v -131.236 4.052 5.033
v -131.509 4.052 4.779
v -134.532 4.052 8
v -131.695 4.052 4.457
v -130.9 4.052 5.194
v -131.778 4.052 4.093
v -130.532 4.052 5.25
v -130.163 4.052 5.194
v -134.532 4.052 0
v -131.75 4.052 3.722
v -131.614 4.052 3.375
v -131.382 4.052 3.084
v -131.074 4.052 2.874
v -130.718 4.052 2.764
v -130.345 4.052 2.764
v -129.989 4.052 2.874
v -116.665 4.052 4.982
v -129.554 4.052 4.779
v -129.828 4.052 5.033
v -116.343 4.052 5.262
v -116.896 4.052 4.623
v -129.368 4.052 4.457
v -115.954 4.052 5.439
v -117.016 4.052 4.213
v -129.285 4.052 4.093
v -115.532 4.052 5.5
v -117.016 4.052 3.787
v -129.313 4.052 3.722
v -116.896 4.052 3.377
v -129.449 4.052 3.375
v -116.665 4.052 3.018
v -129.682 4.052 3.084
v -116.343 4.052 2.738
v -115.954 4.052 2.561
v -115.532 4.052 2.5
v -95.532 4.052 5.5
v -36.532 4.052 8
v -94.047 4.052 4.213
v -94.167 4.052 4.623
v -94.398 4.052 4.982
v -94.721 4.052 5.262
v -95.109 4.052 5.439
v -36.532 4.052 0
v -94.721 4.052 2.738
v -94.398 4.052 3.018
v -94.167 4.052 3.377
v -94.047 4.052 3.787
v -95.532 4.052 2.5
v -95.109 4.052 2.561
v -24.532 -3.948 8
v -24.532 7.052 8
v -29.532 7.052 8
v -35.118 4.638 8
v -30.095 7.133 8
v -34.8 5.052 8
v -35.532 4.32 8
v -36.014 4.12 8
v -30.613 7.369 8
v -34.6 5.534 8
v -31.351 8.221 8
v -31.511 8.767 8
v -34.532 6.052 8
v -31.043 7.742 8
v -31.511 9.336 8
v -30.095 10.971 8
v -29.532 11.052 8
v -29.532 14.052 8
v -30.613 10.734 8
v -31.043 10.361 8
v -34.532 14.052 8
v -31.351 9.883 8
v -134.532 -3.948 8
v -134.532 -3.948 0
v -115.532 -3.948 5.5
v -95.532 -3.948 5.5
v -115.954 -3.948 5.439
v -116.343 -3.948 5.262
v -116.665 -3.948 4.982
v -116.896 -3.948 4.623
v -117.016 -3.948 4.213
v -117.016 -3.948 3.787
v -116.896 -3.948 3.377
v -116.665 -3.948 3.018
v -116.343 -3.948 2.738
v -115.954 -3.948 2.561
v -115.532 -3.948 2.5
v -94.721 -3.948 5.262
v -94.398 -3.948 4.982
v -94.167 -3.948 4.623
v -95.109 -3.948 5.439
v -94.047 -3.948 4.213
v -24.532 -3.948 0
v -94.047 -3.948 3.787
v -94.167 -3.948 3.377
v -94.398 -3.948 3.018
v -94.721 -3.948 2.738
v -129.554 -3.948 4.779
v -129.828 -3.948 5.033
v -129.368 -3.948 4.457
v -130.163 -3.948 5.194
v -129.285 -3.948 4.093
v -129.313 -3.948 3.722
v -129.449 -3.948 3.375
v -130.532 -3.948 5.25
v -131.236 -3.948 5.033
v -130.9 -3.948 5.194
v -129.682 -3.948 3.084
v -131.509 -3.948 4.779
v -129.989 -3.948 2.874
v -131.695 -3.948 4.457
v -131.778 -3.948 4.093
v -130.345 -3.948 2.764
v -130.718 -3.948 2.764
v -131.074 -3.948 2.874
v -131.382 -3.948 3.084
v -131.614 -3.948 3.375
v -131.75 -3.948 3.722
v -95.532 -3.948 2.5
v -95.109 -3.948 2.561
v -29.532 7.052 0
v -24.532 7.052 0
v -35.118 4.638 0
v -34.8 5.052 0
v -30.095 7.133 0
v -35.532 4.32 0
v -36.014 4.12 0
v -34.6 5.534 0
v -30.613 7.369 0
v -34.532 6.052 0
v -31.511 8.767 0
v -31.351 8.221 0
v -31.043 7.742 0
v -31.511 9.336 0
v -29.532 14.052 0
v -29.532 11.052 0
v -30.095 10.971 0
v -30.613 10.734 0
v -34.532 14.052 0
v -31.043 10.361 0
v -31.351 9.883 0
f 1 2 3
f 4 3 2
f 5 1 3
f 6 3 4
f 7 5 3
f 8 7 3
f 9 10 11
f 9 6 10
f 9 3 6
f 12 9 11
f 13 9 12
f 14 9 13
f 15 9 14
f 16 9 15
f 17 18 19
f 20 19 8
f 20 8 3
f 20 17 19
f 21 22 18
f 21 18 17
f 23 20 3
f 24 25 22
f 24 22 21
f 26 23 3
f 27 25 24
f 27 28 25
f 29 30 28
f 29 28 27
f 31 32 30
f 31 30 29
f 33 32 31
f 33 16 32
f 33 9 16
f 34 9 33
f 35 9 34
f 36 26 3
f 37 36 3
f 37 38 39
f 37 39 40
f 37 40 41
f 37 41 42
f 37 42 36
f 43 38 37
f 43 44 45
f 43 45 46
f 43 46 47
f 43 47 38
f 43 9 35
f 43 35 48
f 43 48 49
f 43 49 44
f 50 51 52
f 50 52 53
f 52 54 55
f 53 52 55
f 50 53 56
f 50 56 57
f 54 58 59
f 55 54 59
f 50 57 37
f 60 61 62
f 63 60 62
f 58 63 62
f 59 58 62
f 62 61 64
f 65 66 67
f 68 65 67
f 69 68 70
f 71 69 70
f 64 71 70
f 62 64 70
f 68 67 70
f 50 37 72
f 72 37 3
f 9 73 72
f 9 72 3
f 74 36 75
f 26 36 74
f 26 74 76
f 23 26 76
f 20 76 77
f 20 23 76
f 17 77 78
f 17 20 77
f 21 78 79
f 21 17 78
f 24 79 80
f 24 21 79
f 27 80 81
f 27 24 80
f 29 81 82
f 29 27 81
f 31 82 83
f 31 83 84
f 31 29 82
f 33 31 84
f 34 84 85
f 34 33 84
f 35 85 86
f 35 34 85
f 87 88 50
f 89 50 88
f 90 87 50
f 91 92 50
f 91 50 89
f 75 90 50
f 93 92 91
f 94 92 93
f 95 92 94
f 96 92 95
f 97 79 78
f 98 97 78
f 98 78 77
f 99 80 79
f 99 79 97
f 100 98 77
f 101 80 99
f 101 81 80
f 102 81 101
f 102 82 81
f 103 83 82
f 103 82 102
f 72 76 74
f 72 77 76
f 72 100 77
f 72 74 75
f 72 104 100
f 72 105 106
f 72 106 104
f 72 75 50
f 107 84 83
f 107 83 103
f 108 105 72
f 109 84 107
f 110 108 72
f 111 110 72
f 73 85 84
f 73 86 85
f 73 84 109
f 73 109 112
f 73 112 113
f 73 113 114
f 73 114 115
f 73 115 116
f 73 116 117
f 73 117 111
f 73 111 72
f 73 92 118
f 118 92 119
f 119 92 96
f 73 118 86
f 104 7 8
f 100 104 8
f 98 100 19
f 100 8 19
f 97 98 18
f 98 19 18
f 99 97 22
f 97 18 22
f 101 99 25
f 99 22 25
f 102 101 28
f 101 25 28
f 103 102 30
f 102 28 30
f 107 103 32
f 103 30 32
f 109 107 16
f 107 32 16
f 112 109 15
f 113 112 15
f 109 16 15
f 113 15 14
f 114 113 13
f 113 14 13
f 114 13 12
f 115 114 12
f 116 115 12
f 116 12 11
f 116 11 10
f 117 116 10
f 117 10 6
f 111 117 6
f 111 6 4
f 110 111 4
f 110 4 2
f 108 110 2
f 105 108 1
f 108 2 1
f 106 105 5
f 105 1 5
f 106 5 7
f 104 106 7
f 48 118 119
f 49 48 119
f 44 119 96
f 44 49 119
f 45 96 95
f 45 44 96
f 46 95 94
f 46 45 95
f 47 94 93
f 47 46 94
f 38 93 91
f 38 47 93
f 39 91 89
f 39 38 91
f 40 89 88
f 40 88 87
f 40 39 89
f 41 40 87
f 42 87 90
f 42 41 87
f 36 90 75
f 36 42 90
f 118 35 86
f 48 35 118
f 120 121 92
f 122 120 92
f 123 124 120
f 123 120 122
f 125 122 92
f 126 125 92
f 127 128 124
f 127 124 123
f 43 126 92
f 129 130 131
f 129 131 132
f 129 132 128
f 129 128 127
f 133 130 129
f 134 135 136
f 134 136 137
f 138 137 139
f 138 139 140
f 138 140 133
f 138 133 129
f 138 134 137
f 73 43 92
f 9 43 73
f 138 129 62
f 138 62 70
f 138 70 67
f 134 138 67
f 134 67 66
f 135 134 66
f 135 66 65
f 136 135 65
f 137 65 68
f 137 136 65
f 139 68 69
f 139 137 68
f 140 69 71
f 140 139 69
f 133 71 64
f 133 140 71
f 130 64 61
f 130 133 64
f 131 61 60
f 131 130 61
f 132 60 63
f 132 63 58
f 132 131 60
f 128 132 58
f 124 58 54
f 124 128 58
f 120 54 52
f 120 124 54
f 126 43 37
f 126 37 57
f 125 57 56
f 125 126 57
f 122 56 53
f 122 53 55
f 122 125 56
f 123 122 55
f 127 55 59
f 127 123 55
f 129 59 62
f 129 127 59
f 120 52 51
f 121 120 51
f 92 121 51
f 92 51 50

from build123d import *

# Parameters (mm, degrees)
BOSS_EXTRUDE2_DEPTH = 8
SKETCH3_R           = 1.25
CUT_EXTRUDE1_DEPTH  = 8
CUT_EXTRUDE2_DEPTH  = 8


with BuildPart() as part:
    # Sketch1 → Boss-Extrude2 (new body)
    with BuildSketch(Plane.XY):
        with BuildLine():
            Line((-29.531751908, 7.051775609), (-24.531751908, 7.051775609))
            Line((-24.531751908, 7.051775609), (-24.531751908, -3.948224391))
            Line((-24.531751908, -3.948224391), (-134.531751908, -3.948224391))
            Line((-134.531751908, -3.948224391), (-134.531751908, 4.051775609))
            Line((-134.531751908, 4.051775609), (-36.531751908, 4.051775609))
            ThreePointArc((-36.531751908, 4.051775609), (-35.117538345, 4.637562047), (-34.531751908, 6.051775609))
            Line((-34.531751908, 6.051775609), (-34.531751908, 14.051775609))
            Line((-34.531751908, 14.051775609), (-29.531751908, 14.051775609))
            Line((-29.531751908, 14.051775609), (-29.531751908, 11.051775609))
            ThreePointArc((-29.531751908, 11.051775609), (-31.531751908, 9.051775609), (-29.531751908, 7.051775609))
        make_face()
    extrude(amount=BOSS_EXTRUDE2_DEPTH)

    # Sketch3 → Cut-Extrude1 (cut)
    with BuildSketch(Plane(origin=(0, 4.051775609, 0), x_dir=(1, 0, 0), z_dir=(0, 1, 0))):
        with Locations(Location((-130.531751908, -4, 0), (0, 0, 270))):
            Circle(SKETCH3_R)
    extrude(amount=-CUT_EXTRUDE1_DEPTH, mode=Mode.SUBTRACT)

    # Sketch4 → Cut-Extrude2 (cut)
    with BuildSketch(Plane(origin=(0, 4.051775609, 0), x_dir=(1, 0, 0), z_dir=(0, 1, 0))):
        with BuildLine():
            Line((-115.531751908, -2.5), (-95.531751908, -2.5))
            ThreePointArc((-95.531751908, -2.5), (-94.031751908, -4), (-95.531751908, -5.5))
            Line((-95.531751908, -5.5), (-115.531751908, -5.5))
            ThreePointArc((-115.531751908, -5.5), (-117.031751908, -4), (-115.531751908, -2.5))
        make_face()
    extrude(amount=-CUT_EXTRUDE2_DEPTH, mode=Mode.SUBTRACT)


solid = part.part
